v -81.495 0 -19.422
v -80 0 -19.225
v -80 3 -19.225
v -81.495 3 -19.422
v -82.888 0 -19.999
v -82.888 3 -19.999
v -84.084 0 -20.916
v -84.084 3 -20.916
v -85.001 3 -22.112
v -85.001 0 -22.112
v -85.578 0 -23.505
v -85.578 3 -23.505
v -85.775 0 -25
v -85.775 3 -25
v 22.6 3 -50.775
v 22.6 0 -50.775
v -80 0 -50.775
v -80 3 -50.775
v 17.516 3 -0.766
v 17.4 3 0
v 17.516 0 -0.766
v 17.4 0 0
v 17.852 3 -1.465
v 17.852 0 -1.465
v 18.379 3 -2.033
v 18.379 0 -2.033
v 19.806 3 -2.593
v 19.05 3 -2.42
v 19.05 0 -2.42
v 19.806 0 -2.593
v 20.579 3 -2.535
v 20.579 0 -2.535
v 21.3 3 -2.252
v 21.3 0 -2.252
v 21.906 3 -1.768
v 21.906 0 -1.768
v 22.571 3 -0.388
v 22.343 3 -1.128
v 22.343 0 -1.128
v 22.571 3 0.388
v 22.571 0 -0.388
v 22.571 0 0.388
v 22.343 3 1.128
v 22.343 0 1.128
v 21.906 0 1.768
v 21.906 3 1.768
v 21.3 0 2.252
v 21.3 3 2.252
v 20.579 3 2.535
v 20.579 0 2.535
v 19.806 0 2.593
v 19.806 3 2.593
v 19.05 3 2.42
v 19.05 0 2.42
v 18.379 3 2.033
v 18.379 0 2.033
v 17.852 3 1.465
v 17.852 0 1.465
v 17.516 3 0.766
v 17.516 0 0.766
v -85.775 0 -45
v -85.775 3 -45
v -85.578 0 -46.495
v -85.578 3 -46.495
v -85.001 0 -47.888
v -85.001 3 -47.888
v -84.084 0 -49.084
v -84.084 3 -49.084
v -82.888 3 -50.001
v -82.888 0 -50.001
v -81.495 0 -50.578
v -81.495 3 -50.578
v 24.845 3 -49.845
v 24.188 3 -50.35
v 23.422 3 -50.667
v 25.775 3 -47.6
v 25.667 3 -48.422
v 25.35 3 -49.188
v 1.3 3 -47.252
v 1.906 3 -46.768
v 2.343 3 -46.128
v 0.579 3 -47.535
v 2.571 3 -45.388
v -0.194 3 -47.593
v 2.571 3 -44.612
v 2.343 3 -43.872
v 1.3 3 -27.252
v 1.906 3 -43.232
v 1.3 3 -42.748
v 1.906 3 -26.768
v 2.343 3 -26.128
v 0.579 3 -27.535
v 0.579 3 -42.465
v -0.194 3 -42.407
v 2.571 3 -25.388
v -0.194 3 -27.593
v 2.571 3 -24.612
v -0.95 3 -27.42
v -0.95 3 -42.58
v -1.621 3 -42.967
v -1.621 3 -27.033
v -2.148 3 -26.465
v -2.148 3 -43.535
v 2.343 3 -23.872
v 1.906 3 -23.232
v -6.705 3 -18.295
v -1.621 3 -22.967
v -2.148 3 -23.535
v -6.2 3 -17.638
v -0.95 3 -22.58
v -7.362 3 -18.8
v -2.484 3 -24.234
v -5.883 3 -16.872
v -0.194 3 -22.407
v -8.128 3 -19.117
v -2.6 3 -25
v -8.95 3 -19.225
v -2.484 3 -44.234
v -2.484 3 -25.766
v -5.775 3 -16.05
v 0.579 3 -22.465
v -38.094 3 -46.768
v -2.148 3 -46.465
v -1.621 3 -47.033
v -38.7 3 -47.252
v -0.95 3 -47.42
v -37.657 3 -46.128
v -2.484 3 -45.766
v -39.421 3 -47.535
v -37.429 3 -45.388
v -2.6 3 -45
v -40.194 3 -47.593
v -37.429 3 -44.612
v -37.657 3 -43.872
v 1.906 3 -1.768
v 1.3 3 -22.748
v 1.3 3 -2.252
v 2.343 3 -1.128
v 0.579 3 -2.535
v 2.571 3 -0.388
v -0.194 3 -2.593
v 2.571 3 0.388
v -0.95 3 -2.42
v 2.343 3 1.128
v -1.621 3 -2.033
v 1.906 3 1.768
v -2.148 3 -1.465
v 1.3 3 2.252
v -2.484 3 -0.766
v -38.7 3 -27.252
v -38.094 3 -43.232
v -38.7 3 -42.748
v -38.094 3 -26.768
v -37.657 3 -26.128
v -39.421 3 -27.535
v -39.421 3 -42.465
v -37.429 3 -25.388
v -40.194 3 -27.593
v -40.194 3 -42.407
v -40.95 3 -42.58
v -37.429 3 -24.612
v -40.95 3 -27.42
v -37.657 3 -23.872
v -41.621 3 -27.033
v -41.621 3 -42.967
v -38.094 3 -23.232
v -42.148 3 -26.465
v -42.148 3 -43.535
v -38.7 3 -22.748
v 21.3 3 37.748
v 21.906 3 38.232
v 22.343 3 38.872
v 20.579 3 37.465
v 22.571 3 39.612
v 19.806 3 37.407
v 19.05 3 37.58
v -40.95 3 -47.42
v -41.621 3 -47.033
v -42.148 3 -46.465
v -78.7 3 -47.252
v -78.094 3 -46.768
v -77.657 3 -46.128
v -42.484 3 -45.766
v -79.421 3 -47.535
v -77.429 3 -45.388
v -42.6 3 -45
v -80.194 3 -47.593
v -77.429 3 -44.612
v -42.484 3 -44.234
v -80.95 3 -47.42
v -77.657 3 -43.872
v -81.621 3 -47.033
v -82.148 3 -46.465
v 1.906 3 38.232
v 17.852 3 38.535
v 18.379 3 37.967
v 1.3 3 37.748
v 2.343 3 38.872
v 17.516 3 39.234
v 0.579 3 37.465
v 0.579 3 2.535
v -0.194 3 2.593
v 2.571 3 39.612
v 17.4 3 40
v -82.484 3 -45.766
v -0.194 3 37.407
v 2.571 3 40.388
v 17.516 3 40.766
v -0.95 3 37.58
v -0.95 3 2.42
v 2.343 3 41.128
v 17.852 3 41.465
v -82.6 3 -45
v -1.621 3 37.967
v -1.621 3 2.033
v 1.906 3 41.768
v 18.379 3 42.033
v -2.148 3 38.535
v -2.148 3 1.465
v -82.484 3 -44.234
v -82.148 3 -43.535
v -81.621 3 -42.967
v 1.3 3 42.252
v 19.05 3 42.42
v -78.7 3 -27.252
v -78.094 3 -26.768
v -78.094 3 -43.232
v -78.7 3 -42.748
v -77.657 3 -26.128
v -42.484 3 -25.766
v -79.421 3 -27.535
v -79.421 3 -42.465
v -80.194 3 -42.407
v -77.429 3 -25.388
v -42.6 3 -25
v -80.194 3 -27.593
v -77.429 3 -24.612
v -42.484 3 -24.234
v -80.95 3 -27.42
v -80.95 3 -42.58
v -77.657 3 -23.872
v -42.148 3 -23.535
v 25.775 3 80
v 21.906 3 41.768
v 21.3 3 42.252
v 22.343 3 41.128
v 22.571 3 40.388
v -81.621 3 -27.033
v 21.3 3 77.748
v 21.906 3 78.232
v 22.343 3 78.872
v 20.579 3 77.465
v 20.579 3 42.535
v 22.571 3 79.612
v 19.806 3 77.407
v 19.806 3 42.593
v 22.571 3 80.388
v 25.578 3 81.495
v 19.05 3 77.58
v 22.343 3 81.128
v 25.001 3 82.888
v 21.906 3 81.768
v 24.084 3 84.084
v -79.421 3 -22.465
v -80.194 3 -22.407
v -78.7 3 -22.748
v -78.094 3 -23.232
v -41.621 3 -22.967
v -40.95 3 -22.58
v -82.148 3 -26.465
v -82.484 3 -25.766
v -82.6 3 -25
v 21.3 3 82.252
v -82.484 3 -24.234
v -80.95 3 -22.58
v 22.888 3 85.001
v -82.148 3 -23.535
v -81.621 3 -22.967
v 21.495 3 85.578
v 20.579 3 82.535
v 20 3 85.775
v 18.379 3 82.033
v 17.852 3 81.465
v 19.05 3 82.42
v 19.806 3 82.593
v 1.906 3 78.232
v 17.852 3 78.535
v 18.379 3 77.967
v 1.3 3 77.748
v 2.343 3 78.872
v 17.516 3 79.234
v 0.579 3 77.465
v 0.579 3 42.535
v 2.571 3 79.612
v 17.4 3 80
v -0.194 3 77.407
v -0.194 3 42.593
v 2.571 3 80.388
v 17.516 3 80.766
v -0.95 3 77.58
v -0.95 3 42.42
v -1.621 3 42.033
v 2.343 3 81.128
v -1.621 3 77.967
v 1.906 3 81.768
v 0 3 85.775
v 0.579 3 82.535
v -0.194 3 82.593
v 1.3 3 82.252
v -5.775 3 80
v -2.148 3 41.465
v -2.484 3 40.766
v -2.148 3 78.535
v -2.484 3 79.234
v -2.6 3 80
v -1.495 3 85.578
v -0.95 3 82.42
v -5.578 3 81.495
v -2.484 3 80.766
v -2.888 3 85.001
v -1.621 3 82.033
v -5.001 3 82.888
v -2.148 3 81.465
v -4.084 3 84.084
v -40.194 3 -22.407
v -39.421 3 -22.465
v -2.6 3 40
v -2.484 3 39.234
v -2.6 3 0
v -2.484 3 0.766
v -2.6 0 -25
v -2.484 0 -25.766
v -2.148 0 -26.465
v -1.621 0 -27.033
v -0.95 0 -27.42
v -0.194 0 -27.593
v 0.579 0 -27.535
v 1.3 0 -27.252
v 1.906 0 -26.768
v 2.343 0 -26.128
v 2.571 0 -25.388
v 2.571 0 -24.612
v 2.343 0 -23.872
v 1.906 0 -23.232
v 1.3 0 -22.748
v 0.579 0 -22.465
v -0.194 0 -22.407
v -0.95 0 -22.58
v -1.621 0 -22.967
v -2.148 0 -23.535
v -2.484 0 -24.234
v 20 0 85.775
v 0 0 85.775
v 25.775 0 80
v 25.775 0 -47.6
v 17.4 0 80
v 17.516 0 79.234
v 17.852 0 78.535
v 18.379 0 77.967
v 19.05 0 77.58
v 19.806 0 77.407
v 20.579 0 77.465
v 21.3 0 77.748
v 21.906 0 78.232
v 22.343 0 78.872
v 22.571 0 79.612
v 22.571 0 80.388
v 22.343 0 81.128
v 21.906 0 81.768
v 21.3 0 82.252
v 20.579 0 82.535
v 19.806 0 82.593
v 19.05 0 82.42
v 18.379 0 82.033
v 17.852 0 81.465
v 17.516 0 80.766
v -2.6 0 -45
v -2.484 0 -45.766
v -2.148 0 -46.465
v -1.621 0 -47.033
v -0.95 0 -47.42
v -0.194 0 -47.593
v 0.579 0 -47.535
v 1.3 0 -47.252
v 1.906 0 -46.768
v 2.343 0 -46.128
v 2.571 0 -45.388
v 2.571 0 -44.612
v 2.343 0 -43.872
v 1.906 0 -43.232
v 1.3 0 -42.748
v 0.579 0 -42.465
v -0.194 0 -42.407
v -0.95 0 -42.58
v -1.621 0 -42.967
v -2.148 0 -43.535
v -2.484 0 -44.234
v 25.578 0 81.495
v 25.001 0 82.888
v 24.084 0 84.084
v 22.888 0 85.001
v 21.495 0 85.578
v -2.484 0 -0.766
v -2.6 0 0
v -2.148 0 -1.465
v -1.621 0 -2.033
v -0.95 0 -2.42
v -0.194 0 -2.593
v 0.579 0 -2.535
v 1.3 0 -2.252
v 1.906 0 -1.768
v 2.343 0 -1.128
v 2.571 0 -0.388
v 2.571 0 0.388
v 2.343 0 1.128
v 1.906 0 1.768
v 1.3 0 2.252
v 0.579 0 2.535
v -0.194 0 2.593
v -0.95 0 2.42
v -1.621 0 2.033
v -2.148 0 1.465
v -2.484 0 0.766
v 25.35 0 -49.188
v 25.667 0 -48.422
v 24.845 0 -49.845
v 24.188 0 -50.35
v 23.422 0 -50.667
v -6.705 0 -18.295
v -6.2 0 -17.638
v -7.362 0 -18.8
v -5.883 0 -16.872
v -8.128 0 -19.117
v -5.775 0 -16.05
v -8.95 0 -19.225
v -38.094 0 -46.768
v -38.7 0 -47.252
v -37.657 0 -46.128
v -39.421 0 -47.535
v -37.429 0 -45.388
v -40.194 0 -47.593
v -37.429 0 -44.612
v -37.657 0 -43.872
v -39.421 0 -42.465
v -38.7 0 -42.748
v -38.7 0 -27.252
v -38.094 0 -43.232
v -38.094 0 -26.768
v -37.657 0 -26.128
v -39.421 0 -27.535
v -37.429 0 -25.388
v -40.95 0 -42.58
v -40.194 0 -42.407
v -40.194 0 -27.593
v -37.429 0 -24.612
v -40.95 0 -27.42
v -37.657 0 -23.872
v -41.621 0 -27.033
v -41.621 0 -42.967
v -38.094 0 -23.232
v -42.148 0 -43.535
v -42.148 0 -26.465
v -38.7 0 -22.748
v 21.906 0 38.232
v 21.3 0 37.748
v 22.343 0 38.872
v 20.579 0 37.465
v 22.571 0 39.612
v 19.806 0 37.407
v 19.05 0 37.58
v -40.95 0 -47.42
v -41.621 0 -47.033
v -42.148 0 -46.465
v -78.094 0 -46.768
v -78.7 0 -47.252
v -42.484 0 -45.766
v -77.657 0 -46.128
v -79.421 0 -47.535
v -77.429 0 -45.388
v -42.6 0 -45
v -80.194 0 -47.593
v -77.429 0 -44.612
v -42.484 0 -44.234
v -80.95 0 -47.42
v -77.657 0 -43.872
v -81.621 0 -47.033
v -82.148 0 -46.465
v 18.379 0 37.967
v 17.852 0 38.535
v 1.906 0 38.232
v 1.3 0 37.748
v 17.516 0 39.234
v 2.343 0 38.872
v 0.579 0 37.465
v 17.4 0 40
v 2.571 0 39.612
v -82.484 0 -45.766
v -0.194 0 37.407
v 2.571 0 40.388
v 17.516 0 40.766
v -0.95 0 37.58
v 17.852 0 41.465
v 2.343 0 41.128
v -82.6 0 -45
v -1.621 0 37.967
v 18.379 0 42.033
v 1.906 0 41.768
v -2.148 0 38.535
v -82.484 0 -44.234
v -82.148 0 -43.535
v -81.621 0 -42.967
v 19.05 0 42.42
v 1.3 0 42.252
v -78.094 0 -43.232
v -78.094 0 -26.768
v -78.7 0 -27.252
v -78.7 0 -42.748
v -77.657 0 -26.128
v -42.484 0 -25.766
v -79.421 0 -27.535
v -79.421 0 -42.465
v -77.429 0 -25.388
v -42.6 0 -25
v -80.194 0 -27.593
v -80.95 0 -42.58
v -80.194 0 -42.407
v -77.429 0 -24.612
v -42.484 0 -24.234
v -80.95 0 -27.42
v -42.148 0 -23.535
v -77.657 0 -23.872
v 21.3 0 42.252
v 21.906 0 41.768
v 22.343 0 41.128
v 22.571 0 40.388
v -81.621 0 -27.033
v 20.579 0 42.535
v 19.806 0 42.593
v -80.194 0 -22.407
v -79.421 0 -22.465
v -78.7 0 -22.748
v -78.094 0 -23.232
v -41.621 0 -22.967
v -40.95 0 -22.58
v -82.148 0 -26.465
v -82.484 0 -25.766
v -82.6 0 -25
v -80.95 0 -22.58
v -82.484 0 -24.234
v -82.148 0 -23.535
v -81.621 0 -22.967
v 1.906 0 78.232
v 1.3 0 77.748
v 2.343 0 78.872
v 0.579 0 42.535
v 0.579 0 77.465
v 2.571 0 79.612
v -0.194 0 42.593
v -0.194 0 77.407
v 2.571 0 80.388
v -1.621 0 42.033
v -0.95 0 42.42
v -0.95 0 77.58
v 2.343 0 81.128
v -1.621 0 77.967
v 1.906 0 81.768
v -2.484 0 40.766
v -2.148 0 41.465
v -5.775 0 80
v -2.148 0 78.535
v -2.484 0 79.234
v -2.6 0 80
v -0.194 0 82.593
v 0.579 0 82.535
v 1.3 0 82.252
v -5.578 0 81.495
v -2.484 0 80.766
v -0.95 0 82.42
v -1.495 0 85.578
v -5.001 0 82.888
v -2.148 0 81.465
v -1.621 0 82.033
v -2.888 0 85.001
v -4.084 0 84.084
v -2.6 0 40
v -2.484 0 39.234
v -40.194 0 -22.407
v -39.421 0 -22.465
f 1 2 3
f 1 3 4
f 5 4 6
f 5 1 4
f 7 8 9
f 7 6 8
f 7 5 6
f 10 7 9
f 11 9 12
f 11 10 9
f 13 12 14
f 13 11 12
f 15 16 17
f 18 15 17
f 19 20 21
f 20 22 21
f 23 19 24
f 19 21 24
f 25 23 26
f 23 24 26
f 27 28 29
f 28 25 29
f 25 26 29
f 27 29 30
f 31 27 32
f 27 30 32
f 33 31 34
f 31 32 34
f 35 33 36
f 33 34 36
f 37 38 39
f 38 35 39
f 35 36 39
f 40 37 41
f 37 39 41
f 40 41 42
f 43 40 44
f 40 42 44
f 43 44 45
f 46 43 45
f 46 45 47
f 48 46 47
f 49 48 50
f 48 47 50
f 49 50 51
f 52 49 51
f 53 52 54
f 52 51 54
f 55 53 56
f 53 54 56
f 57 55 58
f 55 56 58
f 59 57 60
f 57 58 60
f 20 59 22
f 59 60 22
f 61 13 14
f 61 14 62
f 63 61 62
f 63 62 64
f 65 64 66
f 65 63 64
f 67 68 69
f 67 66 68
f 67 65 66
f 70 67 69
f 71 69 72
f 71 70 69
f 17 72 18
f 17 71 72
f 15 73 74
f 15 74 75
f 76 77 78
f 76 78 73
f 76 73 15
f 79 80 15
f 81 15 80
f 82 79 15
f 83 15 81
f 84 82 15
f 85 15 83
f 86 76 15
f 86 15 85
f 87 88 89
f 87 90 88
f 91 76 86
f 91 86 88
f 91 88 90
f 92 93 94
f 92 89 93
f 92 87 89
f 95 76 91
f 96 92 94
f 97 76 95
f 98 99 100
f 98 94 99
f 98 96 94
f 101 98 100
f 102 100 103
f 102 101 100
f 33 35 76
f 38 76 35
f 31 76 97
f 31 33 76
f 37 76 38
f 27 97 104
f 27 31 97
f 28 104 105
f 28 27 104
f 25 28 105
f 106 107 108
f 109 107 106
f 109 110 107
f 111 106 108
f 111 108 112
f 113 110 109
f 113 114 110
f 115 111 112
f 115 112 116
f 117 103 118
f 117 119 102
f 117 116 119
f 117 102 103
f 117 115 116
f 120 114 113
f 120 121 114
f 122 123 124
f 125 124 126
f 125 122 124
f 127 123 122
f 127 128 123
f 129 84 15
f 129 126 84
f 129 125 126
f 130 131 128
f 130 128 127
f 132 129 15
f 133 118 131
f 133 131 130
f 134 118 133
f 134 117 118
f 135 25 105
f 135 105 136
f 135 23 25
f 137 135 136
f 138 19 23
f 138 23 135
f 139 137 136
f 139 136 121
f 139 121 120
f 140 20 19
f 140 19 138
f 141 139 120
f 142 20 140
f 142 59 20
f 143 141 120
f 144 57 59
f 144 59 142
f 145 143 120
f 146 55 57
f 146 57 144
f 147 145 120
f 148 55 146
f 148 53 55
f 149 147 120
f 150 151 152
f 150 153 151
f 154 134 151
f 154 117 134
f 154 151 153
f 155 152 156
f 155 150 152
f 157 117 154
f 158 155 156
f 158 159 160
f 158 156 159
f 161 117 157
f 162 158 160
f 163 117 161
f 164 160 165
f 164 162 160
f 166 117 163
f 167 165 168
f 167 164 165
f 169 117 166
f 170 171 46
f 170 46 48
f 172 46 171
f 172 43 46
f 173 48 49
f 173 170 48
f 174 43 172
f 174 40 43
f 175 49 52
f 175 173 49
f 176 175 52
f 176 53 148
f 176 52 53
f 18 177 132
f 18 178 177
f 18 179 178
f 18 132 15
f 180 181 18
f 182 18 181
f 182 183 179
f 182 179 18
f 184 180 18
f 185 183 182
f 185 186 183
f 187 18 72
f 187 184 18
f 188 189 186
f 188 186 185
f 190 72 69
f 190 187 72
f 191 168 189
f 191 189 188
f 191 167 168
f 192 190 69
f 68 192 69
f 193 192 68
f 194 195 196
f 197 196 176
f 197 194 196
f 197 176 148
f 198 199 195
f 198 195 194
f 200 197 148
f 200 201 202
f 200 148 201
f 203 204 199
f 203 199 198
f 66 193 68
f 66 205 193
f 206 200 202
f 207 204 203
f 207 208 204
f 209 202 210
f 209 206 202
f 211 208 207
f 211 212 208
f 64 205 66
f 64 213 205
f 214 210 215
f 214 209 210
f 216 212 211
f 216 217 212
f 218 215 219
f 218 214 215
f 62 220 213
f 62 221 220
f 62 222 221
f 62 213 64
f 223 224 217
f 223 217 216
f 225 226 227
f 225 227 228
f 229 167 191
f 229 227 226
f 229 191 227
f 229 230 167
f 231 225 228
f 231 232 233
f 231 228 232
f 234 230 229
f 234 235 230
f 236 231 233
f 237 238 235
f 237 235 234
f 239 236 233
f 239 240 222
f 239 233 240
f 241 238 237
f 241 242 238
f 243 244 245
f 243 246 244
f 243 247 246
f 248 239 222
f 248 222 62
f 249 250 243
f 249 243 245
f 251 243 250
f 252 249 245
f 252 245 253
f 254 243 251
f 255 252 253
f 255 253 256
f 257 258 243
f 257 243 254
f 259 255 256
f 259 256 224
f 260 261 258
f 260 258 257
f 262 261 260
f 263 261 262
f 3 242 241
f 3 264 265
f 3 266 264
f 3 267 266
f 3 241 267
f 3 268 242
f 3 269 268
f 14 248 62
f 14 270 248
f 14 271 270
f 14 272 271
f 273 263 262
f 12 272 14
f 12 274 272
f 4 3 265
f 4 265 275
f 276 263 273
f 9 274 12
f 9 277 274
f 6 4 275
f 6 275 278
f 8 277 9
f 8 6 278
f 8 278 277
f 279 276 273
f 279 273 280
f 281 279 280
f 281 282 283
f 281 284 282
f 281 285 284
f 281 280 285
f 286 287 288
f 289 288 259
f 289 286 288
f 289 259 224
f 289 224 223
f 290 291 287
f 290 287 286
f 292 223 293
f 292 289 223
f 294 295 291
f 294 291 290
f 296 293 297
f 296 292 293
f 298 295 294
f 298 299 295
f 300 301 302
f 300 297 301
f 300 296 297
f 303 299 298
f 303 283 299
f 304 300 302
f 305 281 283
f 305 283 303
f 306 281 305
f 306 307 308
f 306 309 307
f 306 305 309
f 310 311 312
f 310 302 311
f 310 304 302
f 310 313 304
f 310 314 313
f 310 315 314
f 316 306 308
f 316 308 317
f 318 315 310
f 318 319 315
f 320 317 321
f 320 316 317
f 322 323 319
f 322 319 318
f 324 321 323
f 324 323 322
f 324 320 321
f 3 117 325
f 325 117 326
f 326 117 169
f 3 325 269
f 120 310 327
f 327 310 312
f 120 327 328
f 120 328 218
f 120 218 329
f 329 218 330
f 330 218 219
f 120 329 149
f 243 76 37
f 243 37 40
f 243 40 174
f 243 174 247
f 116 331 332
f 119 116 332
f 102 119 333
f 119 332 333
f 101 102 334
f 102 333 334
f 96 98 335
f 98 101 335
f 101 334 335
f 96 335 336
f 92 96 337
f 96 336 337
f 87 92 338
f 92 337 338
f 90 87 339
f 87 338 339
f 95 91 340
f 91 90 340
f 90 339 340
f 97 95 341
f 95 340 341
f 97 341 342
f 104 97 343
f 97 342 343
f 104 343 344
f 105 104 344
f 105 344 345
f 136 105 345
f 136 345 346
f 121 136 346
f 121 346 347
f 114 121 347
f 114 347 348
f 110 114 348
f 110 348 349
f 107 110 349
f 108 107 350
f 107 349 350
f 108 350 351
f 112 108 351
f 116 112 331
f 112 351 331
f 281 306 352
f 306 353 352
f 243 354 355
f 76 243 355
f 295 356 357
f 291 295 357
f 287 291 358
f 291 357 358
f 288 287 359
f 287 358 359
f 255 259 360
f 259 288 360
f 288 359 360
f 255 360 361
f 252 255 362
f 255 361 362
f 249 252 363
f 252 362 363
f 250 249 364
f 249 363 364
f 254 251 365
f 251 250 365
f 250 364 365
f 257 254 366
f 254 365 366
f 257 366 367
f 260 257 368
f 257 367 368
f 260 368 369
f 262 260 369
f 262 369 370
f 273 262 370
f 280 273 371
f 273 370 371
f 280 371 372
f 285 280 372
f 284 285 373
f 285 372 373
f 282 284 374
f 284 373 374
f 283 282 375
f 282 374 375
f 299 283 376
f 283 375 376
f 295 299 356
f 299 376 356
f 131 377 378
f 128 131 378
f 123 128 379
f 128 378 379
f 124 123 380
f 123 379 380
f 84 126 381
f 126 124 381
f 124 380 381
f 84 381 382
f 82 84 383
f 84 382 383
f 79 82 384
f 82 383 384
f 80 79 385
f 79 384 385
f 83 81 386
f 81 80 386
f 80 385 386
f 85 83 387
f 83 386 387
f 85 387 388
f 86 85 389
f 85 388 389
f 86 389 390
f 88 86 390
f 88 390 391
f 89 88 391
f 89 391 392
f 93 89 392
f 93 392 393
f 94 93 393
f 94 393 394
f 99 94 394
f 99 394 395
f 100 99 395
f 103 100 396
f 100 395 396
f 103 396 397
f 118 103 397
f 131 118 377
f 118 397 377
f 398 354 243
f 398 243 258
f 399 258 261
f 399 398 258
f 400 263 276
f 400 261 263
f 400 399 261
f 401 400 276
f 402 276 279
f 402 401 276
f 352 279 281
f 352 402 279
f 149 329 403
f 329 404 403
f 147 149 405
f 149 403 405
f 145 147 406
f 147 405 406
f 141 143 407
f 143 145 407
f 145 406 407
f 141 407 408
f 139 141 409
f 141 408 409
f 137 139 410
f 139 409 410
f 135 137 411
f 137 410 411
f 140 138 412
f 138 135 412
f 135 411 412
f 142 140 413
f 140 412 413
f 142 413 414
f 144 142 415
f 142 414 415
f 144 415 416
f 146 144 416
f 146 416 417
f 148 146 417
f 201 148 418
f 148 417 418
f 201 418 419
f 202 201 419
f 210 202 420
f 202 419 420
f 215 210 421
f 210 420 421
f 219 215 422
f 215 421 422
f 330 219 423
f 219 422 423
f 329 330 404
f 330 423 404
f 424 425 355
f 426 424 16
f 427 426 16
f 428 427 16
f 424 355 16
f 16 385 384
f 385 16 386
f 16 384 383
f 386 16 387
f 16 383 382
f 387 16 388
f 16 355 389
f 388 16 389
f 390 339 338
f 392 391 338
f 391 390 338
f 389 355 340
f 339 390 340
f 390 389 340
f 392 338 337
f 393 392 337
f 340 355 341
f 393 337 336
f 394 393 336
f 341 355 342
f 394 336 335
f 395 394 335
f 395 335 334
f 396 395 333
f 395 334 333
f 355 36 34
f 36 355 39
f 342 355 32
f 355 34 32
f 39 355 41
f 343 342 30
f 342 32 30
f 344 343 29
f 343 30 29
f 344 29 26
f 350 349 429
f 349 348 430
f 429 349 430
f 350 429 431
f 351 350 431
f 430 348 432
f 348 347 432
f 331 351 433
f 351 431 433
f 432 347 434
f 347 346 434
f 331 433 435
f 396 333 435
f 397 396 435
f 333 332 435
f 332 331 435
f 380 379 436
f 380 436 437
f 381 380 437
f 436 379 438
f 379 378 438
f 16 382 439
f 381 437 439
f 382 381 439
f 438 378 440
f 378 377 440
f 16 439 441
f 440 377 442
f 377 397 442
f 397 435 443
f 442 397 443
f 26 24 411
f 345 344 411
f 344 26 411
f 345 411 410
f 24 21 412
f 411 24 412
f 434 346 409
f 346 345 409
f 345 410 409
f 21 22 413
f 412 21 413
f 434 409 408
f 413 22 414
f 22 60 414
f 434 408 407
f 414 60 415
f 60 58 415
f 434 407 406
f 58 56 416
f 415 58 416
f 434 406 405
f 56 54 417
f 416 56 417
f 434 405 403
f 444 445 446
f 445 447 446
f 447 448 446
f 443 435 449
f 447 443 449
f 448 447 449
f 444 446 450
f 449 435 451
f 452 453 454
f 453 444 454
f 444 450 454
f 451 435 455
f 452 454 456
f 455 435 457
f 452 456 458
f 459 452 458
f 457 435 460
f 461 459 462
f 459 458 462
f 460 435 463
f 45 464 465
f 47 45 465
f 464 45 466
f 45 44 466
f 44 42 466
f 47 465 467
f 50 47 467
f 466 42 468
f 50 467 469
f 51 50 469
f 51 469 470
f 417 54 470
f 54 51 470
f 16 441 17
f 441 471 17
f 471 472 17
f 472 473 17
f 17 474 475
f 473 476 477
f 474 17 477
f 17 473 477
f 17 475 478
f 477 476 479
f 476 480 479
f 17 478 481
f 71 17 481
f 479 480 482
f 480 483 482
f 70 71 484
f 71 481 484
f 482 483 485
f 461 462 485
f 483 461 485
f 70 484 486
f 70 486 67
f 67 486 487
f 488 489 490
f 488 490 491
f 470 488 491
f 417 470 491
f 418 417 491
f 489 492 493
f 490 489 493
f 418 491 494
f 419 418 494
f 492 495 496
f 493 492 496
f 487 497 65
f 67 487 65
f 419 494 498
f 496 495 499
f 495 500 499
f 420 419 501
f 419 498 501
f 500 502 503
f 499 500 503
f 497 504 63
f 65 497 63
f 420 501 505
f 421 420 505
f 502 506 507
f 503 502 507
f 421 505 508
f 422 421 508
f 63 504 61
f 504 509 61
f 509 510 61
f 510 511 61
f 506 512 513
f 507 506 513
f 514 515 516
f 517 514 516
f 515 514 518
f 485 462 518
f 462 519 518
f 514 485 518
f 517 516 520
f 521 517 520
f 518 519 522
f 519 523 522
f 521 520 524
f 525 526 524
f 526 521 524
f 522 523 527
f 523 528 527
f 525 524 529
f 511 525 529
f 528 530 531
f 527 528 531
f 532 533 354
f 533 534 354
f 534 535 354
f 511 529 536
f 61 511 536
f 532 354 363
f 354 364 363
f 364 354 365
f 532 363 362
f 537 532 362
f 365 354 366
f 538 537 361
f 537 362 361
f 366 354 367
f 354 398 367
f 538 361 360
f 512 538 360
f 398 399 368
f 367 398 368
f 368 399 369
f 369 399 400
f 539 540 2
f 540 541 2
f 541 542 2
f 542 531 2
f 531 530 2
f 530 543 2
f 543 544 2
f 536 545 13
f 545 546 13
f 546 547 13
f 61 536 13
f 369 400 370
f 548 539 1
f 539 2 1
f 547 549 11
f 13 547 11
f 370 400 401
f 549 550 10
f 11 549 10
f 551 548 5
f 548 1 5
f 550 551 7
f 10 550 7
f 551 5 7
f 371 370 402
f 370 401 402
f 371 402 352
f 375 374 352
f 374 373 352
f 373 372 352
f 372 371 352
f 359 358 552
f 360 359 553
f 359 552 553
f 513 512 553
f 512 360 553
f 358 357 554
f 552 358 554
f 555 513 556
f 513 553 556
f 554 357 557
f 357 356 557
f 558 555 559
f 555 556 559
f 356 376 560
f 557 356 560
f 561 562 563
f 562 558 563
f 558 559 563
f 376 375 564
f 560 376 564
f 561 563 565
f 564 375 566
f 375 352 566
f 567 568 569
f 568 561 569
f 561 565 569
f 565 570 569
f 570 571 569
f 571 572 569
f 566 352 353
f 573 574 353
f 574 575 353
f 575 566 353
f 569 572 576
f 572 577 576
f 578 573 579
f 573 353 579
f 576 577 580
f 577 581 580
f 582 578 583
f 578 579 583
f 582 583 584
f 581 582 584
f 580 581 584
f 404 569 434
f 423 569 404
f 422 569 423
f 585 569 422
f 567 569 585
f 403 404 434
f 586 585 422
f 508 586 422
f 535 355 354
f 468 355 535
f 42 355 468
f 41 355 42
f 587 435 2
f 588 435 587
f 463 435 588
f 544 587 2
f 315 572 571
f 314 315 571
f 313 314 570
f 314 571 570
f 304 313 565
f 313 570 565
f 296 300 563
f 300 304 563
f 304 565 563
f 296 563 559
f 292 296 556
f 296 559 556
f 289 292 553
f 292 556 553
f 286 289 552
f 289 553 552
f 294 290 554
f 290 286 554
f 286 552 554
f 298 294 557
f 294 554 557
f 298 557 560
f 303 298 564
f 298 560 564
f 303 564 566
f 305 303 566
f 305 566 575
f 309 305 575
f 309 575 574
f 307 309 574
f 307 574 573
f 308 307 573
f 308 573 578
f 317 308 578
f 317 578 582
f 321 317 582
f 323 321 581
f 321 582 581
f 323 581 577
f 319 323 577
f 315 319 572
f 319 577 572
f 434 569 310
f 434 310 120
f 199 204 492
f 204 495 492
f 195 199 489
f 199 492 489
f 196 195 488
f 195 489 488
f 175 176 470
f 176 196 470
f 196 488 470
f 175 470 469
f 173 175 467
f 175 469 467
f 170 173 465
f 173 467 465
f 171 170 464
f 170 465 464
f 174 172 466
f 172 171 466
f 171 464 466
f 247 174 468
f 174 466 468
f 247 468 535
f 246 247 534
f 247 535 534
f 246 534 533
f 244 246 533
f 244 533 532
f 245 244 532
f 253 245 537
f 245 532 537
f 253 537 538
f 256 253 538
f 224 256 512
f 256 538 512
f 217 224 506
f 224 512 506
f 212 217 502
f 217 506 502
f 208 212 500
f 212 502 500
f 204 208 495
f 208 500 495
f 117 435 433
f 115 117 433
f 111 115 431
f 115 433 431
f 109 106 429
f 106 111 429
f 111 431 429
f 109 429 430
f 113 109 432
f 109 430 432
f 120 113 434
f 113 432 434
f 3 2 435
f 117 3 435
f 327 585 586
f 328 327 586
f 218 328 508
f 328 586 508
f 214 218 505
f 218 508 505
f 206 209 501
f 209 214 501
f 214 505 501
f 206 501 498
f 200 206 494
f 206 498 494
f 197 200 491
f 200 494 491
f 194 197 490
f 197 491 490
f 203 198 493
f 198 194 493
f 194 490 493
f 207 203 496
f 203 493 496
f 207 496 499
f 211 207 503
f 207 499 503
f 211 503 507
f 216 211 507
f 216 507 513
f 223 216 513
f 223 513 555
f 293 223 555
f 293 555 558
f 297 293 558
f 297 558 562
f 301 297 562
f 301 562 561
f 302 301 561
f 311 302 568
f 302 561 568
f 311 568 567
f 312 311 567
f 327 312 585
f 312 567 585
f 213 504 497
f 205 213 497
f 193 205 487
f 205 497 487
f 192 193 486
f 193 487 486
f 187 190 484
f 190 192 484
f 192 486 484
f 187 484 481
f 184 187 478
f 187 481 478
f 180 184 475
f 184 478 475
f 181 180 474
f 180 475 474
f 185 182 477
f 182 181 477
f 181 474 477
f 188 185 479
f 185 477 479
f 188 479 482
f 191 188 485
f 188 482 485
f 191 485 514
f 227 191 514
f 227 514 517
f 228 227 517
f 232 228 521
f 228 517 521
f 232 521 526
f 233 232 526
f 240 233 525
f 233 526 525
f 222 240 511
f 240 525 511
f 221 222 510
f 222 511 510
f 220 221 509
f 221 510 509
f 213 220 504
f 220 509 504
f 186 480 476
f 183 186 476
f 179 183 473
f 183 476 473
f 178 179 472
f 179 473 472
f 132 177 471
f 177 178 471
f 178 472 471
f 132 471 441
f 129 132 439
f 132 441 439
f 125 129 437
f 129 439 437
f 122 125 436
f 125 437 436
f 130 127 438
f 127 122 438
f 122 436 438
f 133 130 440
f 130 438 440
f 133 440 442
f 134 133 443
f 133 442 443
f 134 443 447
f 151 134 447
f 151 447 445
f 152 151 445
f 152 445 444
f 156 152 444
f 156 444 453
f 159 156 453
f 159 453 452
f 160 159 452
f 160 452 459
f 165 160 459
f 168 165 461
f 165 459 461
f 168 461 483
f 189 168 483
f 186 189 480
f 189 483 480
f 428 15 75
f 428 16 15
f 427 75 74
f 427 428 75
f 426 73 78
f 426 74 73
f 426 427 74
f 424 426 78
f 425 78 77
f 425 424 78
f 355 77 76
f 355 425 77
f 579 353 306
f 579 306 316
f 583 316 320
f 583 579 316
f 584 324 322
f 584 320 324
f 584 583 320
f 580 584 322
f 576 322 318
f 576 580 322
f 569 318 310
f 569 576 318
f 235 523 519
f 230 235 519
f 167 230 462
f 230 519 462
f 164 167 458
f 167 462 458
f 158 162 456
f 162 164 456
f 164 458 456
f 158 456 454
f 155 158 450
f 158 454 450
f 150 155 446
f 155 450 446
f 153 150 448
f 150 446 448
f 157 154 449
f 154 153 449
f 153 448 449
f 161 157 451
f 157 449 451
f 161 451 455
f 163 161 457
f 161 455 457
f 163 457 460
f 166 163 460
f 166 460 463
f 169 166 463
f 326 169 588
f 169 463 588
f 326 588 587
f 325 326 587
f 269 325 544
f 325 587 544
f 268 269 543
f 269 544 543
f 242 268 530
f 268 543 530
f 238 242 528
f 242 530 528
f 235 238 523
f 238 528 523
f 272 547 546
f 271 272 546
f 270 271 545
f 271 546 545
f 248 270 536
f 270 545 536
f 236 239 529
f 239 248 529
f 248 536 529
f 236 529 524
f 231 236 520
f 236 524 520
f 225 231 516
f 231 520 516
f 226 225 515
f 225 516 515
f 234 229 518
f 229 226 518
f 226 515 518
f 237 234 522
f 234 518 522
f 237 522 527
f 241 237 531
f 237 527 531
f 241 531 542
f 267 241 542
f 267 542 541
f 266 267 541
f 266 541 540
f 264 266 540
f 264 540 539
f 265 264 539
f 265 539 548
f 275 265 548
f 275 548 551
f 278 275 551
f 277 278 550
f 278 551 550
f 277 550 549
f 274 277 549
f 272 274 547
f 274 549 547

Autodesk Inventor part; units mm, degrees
ref_plane "YZ Plane" through (0, 0, 0) normal (1, 0, 0) x (0, 1, 0)
ref_plane "XZ Plane" through (0, 0, 0) normal (0, 1, 0) x (-1, 0, 0)
ref_plane "XY Plane" through (0, 0, 0) normal (0, 0, 1) x (1, 0, 0)
sketch "Sketch1" plane through (0, 0, 0) normal (0, 1, 0) x (-1, 0, 0)
  circle A0 centre (0, 0) radius 2.6
  line L0 (0, 0) -> (0, -2.6) construction
  line L1 (0, 0) -> (-2.6, 0) construction
  circle A1 centre (-20, 0) radius 2.6
  circle A2 centre (0, 40) radius 2.6
  circle A3 centre (-20, 40) radius 2.6
  circle A4 centre (0, 80) radius 2.6
  circle A5 centre (-20, 80) radius 2.6
  circle A6 centre (0, -25) radius 2.6
  line L2 (0, -25) -> (2.6, -25) construction
  line L3 (0, -25) -> (0, -27.6) construction
  circle A7 centre (40, -25) radius 2.6
  circle A8 centre (80, -25) radius 2.6
  circle A9 centre (0, -45) radius 2.6
  circle A10 centre (40, -45) radius 2.6
  circle A11 centre (80, -45) radius 2.6
  circle A12 centre (0, 80) radius 5.775 construction
  circle A13 centre (-20, 80) radius 5.775 construction
  circle A14 centre (80, -45) radius 5.775 construction
  circle A15 centre (80, -25) radius 5.775 construction
  line L4 (5.775, 80) -> (5.775, -16.05)
  line L5 (0, 85.775) -> (-20, 85.775)
  arc A16 (5.775, 80) -> (0, 85.775) centre (0, 80) ccw
  arc A17 (-20, 85.775) -> (-25.775, 80) centre (-20, 80) ccw
  line L6 (80, -19.225) -> (8.95, -19.225)
  line L7 (-25.775, 80) -> (-25.775, -47.6)
  line L8 (-22.6, -50.775) -> (80, -50.775)
  arc A18 (-25.775, -47.6) -> (-22.6, -50.775) centre (-22.6, -47.6) ccw
  arc A19 (5.775, -16.05) -> (8.95, -19.225) centre (8.95, -16.05) ccw
  line L9 (85.775, -25) -> (85.775, -45)
  arc A20 (80, -50.775) -> (85.775, -45) centre (80, -45) ccw
  arc A21 (85.775, -25) -> (80, -19.225) centre (80, -25) ccw
  point P0 (-20, -2.6)
  point P1 (-22.6, 0)
  point P2 (0, 37.4)
  point P3 (-2.6, 40)
  point P4 (-20, 37.4)
  point P5 (-22.6, 40)
  point P6 (0, 77.4)
  point P7 (-2.6, 80)
  point P8 (-20, 77.4)
  point P9 (-22.6, 80)
  point P10 (42.6, -25)
  point P11 (40, -27.6)
  point P12 (82.6, -25)
  point P13 (80, -27.6)
  point P14 (2.6, -45)
  point P15 (0, -47.6)
  point P16 (42.6, -45)
  point P17 (40, -47.6)
  point P18 (82.6, -45)
  point P19 (80, -47.6)
  point P20 (5.775, -19.225)
  dimension "d0" = 5.2
  dimension "d3" = 20
  dimension "d6" = 40
  dimension "d13" = 40
  dimension "d16" = 20
  dimension "d19" = 3.175
  dimension "d23" = 25
  dimension "d24" = 3.175
extrude "Extrusion2" add sketch "Sketch1" along normal blind 3
properties part number "CNC-003-StructureGusset3" material "Steel AISI 1080"
